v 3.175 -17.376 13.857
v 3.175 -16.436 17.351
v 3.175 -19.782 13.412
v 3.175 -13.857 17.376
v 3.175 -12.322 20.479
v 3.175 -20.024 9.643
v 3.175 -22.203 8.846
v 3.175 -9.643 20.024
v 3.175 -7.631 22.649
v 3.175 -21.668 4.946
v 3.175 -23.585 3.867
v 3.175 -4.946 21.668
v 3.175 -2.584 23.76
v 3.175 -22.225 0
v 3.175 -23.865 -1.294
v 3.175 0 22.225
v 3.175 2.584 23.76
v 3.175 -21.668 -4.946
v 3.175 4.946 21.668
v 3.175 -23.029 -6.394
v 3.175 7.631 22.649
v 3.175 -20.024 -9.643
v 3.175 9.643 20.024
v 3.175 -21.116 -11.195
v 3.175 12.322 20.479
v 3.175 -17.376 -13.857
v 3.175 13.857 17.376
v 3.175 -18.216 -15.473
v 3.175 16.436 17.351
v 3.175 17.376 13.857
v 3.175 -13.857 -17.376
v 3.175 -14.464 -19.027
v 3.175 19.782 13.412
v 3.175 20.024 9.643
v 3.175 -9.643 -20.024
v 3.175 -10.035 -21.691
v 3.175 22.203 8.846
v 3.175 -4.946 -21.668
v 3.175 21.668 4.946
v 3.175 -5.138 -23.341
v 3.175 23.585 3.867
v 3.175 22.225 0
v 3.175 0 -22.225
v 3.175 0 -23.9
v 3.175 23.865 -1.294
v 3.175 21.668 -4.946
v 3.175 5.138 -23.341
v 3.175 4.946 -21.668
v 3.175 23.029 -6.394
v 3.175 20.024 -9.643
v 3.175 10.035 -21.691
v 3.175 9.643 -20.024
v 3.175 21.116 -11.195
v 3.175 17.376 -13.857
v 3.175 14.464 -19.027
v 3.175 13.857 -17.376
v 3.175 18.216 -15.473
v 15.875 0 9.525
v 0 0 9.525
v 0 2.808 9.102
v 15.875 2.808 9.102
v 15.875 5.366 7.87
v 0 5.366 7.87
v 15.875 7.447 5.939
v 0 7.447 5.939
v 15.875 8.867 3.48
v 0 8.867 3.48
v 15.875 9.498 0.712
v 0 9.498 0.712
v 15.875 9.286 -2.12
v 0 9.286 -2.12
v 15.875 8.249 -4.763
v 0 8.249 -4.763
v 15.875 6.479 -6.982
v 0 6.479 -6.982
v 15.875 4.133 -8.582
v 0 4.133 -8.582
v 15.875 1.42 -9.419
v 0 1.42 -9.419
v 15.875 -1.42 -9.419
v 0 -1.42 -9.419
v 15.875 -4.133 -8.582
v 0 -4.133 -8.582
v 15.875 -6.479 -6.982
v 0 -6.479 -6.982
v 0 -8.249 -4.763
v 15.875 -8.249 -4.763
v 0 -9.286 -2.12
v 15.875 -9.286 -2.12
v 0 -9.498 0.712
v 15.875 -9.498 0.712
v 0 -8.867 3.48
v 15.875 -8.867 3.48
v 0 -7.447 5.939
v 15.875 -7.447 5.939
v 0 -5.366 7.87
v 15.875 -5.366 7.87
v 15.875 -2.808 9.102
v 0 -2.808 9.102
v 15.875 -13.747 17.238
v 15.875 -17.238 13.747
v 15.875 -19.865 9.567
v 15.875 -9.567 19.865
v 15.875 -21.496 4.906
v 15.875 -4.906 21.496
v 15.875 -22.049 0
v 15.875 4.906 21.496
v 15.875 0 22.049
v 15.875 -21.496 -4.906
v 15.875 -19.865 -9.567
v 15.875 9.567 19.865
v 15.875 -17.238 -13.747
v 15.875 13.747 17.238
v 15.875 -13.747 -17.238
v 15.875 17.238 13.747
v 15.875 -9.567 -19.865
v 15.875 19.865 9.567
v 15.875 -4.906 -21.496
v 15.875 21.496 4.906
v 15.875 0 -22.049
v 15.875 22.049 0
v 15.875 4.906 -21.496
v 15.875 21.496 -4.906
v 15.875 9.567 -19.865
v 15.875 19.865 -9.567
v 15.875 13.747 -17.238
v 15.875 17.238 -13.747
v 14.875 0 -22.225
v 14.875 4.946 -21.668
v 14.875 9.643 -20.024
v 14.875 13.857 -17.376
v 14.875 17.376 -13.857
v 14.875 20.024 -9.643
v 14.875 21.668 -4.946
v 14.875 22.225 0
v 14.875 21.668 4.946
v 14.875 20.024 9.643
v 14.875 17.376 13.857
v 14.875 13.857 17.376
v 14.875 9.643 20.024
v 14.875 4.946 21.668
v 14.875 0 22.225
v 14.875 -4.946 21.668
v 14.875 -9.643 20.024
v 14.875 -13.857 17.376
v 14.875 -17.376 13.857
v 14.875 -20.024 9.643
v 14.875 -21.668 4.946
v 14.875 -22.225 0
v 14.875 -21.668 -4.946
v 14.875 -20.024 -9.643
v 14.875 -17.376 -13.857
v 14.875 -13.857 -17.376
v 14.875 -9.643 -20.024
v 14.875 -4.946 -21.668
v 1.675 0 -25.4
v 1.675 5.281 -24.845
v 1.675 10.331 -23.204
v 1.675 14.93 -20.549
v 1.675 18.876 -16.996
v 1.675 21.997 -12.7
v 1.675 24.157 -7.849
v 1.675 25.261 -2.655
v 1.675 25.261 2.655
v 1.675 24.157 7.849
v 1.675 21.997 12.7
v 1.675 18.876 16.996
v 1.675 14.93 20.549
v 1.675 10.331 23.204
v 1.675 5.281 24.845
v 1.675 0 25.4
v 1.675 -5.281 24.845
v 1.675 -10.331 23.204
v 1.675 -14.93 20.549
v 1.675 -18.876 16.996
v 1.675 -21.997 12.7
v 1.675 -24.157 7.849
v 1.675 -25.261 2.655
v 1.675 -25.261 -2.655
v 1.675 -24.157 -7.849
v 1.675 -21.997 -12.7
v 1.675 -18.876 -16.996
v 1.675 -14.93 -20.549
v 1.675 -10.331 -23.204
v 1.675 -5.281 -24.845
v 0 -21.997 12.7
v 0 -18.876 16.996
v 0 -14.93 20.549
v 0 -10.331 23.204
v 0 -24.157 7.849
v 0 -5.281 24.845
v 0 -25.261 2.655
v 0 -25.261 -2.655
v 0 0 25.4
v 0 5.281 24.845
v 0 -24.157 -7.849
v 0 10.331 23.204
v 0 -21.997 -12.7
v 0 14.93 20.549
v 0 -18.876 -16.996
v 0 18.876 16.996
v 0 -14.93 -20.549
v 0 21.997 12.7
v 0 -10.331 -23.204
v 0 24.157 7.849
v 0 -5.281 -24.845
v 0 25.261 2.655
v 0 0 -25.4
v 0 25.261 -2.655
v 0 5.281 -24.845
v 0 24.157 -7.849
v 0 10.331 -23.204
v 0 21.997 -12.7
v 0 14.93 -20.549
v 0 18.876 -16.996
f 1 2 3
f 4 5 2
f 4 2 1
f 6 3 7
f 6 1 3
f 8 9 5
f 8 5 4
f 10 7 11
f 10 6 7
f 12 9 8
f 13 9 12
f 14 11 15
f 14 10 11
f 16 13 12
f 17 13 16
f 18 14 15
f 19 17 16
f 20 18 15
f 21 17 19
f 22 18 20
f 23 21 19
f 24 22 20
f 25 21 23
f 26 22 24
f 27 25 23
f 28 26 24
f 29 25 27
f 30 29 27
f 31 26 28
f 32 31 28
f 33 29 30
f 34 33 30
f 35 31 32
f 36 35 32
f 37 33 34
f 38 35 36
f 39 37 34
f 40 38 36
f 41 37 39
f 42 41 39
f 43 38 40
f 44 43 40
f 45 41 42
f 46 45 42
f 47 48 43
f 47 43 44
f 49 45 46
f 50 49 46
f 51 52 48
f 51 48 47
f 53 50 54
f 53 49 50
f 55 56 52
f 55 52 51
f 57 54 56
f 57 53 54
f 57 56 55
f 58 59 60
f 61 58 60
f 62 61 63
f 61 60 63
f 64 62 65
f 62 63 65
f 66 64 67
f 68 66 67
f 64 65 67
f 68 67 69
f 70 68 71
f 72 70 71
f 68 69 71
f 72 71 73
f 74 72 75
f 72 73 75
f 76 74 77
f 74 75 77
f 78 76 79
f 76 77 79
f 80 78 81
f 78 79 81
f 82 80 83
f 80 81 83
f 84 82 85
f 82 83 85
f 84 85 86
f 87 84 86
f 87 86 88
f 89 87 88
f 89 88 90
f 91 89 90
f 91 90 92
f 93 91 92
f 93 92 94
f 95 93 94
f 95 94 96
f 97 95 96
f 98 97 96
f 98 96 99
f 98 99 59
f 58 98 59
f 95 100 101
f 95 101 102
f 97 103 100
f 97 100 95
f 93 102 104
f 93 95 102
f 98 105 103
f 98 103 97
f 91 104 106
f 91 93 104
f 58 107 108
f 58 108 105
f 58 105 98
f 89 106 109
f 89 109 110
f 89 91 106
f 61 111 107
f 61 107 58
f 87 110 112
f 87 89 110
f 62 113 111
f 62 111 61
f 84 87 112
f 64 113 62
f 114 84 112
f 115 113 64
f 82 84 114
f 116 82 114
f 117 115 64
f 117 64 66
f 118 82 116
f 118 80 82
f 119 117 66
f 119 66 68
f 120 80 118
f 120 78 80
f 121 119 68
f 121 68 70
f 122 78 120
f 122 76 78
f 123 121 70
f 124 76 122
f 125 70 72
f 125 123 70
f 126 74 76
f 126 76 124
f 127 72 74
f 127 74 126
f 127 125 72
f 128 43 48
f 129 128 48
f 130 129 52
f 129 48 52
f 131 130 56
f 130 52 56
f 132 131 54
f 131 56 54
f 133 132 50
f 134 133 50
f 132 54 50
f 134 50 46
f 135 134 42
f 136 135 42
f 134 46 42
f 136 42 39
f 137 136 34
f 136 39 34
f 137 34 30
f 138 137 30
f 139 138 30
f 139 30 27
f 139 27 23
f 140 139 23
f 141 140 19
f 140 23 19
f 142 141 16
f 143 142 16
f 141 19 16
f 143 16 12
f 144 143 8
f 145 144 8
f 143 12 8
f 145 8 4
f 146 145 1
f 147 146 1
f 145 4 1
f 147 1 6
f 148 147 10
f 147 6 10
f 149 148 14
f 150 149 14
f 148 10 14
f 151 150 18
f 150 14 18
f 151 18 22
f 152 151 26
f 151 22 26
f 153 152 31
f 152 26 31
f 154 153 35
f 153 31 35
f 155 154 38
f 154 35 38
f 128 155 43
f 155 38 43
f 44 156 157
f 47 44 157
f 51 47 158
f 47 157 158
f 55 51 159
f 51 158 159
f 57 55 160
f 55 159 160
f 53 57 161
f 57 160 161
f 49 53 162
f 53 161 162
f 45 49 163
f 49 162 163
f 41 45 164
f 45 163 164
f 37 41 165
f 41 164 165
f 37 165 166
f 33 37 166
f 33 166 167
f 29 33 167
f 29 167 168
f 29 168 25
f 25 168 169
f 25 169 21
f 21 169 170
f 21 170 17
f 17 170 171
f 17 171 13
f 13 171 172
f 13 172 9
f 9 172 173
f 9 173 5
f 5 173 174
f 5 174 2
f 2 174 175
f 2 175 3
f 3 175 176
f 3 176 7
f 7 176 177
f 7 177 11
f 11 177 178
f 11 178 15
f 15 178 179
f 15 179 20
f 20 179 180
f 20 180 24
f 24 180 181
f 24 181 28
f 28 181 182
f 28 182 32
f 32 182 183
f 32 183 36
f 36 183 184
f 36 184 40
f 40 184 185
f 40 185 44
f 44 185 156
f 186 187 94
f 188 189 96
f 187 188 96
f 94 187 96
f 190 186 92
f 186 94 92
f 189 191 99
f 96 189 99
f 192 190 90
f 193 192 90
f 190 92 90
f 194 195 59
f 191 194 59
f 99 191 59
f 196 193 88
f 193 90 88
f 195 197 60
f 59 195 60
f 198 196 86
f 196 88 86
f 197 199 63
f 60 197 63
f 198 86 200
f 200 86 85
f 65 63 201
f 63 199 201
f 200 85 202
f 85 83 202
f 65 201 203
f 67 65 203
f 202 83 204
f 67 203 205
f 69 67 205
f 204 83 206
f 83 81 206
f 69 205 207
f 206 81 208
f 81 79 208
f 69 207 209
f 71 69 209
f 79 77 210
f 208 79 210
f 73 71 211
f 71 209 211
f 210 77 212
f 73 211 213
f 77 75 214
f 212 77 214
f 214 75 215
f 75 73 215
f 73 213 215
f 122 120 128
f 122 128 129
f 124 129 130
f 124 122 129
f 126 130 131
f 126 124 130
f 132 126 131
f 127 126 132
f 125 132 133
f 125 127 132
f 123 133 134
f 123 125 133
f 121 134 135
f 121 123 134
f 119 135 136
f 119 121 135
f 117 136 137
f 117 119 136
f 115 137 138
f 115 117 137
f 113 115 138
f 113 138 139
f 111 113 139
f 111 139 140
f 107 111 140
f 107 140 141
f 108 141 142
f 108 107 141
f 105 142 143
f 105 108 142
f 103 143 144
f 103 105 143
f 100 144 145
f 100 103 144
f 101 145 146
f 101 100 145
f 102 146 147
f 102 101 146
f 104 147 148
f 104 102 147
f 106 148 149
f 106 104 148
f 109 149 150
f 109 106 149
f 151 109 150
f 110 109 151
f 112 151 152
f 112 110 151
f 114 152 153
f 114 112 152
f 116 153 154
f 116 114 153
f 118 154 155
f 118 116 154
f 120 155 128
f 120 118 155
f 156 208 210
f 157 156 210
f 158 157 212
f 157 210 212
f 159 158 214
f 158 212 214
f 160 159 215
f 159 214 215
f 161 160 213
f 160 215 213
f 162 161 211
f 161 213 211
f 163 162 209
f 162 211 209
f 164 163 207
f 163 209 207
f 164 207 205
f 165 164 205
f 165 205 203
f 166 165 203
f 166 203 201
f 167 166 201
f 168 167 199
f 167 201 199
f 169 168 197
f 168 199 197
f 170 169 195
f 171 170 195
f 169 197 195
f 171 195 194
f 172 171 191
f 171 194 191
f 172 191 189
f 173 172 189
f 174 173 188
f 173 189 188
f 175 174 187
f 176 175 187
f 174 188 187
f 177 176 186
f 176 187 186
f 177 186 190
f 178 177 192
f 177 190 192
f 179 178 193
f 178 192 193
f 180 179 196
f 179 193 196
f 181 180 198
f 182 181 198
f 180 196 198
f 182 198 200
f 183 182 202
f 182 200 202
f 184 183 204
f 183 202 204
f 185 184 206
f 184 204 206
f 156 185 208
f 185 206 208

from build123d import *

# Parameters (mm, degrees)
SKETCH1_R           = 25.4
BOSS_EXTRUDE1_DEPTH = 3.175
SKETCH2_R           = 22.225
BOSS_EXTRUDE2_DEPTH = 12.7
SKETCH3_R           = 9.525
CUT_EXTRUDE1_DEPTH  = 16.875
CHAMFER1_SIZE       = 1
CHAMFER1_SIZE2      = 0.176326981
CHAMFER2_SIZE       = 1.5


with BuildPart() as part:
    # Sketch1 → Boss-Extrude1 (new body)
    with BuildSketch(Plane(origin=(0, 0, 0), x_dir=(0, 0, -1), z_dir=(1, 0, 0))):
        Circle(SKETCH1_R)
    extrude(amount=BOSS_EXTRUDE1_DEPTH)

    # Sketch2 → Boss-Extrude2 (add)
    with BuildSketch(Plane(origin=(3.175, 0, 0), x_dir=(0, 0, -1), z_dir=(1, 0, 0))):
        Circle(SKETCH2_R)
    extrude(amount=BOSS_EXTRUDE2_DEPTH)

    # Sketch3 → Cut-Extrude1 (cut, through all)
    with BuildSketch(Plane.ZY):
        Circle(SKETCH3_R)
    extrude(amount=-CUT_EXTRUDE1_DEPTH, mode=Mode.SUBTRACT)

    # Chamfer1
    chamfer1_edges = [part.edges().sort_by_distance(p)[0] for p in [
        (15.875, 0, 22.225),
    ]]
    chamfer1_side = [part.faces().sort_by_distance(p)[0] for p in [
        (9.525, 0, 22.225),
    ]]
    chamfer(chamfer1_edges, length=CHAMFER1_SIZE, length2=CHAMFER1_SIZE2, reference=chamfer1_side[0])

    # Chamfer2
    chamfer2_edges = [part.edges().sort_by_distance(p)[0] for p in [
        (3.175, 0, 25.4),
    ]]
    chamfer(chamfer2_edges, length=CHAMFER2_SIZE)


solid = part.part
